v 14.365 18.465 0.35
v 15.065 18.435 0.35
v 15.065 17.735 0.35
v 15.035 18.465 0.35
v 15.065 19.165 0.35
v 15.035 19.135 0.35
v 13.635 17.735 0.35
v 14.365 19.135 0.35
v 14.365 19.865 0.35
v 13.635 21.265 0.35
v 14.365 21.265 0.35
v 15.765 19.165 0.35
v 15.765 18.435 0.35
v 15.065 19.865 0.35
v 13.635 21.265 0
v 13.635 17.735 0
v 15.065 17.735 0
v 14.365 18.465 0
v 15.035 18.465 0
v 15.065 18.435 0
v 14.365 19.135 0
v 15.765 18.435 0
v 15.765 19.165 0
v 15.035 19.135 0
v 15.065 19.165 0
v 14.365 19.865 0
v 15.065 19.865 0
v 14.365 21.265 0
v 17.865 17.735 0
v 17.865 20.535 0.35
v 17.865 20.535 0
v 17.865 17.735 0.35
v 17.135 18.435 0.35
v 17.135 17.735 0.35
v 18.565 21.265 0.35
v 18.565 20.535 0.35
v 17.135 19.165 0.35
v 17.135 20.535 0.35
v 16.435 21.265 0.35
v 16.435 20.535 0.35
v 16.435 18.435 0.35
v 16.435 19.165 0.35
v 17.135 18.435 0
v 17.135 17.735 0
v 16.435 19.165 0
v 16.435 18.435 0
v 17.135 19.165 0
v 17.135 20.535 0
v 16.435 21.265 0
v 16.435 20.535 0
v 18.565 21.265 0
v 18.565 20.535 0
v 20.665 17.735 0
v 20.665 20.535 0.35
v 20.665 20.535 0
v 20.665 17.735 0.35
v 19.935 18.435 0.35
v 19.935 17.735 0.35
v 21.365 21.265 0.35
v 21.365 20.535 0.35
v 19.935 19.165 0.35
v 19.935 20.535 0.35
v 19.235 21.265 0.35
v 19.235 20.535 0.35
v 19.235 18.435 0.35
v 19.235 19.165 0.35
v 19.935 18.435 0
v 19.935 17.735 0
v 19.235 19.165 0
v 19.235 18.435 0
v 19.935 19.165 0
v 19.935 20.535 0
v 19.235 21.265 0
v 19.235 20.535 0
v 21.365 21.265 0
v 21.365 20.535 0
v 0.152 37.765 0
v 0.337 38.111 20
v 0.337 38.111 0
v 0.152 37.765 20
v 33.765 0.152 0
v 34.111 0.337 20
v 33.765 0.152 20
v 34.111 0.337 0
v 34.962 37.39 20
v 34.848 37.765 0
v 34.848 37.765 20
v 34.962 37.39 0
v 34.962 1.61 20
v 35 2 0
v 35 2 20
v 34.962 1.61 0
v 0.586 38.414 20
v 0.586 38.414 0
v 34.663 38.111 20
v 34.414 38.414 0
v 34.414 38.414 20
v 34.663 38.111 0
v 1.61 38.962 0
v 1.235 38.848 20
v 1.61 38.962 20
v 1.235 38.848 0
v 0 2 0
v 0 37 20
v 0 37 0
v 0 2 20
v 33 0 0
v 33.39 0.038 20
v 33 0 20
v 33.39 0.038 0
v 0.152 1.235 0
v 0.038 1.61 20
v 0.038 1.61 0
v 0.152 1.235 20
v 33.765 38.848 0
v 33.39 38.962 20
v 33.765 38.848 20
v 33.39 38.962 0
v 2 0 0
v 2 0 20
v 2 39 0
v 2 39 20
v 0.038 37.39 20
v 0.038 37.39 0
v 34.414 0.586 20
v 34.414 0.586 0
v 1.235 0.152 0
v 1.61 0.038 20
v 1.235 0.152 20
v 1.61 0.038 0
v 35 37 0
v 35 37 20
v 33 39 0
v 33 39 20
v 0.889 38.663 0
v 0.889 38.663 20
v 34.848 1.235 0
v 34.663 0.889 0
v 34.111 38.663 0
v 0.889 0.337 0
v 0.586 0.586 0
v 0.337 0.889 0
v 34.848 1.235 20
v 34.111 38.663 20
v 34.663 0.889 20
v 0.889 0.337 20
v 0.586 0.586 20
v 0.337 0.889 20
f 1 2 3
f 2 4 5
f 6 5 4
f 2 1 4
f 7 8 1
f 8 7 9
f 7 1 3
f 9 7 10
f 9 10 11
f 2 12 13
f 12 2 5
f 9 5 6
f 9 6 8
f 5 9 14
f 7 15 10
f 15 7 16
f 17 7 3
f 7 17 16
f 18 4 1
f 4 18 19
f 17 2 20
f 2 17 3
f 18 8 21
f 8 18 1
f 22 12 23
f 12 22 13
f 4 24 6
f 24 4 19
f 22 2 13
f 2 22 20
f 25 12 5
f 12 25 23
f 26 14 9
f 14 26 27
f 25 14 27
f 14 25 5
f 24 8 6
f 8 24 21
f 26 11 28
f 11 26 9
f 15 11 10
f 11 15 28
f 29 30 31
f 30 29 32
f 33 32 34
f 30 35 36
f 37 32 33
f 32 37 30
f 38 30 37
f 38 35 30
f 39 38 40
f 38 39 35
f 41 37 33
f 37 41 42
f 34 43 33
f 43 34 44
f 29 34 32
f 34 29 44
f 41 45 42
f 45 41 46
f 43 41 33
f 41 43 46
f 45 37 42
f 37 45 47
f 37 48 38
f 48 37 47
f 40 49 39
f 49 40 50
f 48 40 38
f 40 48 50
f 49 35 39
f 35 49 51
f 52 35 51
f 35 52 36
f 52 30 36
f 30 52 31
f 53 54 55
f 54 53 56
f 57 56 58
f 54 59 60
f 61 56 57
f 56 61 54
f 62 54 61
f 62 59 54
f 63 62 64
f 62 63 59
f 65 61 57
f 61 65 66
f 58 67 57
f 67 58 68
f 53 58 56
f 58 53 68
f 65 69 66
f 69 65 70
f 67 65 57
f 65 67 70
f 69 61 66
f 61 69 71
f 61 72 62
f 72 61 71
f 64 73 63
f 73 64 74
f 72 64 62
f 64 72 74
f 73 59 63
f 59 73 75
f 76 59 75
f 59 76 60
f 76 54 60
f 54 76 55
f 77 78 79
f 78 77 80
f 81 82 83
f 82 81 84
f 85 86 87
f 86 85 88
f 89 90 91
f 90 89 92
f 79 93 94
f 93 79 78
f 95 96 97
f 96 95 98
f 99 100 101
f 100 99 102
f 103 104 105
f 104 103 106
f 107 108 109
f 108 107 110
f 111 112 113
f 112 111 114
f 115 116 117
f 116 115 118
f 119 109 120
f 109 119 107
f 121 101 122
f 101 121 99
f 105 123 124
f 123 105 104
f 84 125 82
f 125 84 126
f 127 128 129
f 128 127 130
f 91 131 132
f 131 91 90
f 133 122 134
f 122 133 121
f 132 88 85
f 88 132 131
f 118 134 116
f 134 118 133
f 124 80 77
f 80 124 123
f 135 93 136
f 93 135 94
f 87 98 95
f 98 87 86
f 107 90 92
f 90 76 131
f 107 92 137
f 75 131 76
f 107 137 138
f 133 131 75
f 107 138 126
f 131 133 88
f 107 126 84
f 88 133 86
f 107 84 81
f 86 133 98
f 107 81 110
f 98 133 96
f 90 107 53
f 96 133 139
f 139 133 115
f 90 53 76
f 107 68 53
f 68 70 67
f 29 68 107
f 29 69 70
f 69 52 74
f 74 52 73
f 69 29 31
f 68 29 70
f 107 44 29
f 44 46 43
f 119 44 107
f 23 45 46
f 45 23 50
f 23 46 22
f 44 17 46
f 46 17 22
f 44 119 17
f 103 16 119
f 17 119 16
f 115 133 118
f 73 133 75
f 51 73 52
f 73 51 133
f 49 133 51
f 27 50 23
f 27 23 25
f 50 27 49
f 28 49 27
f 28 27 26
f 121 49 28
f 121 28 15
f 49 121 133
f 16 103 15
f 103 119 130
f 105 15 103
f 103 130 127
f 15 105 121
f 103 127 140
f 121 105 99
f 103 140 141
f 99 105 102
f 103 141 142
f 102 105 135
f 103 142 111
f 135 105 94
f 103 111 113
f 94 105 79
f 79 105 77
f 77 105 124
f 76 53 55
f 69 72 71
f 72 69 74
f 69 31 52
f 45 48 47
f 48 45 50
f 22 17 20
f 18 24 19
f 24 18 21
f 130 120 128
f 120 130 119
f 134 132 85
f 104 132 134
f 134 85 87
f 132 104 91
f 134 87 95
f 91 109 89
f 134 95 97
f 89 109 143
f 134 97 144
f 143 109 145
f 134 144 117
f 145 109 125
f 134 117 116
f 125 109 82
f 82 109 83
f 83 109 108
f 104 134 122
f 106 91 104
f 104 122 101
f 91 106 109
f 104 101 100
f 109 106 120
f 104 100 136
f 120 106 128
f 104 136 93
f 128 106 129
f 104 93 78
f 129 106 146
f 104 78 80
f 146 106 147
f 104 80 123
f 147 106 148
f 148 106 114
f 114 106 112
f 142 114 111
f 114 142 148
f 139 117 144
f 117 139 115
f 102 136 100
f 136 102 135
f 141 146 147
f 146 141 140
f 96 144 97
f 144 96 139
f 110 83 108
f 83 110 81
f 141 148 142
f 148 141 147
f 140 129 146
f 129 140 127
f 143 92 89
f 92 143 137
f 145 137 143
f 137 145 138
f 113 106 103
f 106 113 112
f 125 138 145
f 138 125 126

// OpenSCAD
// 選配列印配重塊
$fn=64;
translate([39.5,19.5,-98.6]){rotate([0,0,0]){difference(){translate([-22,0,0]){translate([0,0,98.6]){linear_extrude(height=20)polygon([[17.5,17.5],[17.46157,17.89018],[17.34776,18.26537],[17.16294,18.61114],[16.91421,18.91421],[16.61114,19.16294],[16.26537,19.34776],[15.89018,19.46157],[15.5,19.5],[-15.5,19.5],[-15.89018,19.46157],[-16.26537,19.34776],[-16.61114,19.16294],[-16.91421,18.91421],[-17.16294,18.61114],[-17.34776,18.26537],[-17.46157,17.89018],[-17.5,17.5],[-17.5,-17.5],[-17.46157,-17.89018],[-17.34776,-18.26537],[-17.16294,-18.61114],[-16.91421,-18.91421],[-16.61114,-19.16294],[-16.26537,-19.34776],[-15.89018,-19.46157],[-15.5,-19.5],[15.5,-19.5],[15.89018,-19.46157],[16.26537,-19.34776],[16.61114,-19.16294],[16.91421,-18.91421],[17.16294,-18.61114],[17.34776,-18.26537],[17.46157,-17.89018],[17.5,-17.5]]);}}multmatrix([[1,0,0,-22],[0,-1,0,0],[0,0,-1,98.6],[0,0,0,1]]){union(){union(){union(){union(){union(){union(){union(){union(){union(){union(){union(){union(){union(){union(){union(){union(){union(){union(){union(){union(){union(){union(){union(){translate([-3.865,1.035,-0.35]){cube([0.73,0.73,0.47]);}translate([-3.165,1.035,-0.35]){cube([0.73,0.73,0.47]);}}translate([-3.865,0.335,-0.35]){cube([0.73,0.73,0.47]);}}translate([-2.465,0.335,-0.35]){cube([0.73,0.73,0.47]);}}translate([-3.865,-0.365,-0.35]){cube([0.73,0.73,0.47]);}}translate([-3.165,-0.365,-0.35]){cube([0.73,0.73,0.47]);}}translate([-3.865,-1.065,-0.35]){cube([0.73,0.73,0.47]);}}translate([-3.865,-1.765,-0.35]){cube([0.73,0.73,0.47]);}}translate([-0.365,1.035,-0.35]){cube([0.73,0.73,0.47]);}}translate([-1.065,0.335,-0.35]){cube([0.73,0.73,0.47]);}}translate([-0.365,0.335,-0.35]){cube([0.73,0.73,0.47]);}}translate([-0.365,-0.365,-0.35]){cube([0.73,0.73,0.47]);}}translate([-0.365,-1.065,-0.35]){cube([0.73,0.73,0.47]);}}translate([-1.065,-1.765,-0.35]){cube([0.73,0.73,0.47]);}}translate([-0.365,-1.765,-0.35]){cube([0.73,0.73,0.47]);}}translate([0.335,-1.765,-0.35]){cube([0.73,0.73,0.47]);}}translate([2.435,1.035,-0.35]){cube([0.73,0.73,0.47]);}}translate([1.735,0.335,-0.35]){cube([0.73,0.73,0.47]);}}translate([2.435,0.335,-0.35]){cube([0.73,0.73,0.47]);}}translate([2.435,-0.365,-0.35]){cube([0.73,0.73,0.47]);}}translate([2.435,-1.065,-0.35]){cube([0.73,0.73,0.47]);}}translate([1.735,-1.765,-0.35]){cube([0.73,0.73,0.47]);}}translate([2.435,-1.765,-0.35]){cube([0.73,0.73,0.47]);}}translate([3.135,-1.765,-0.35]){cube([0.73,0.73,0.47]);}}}}}}
